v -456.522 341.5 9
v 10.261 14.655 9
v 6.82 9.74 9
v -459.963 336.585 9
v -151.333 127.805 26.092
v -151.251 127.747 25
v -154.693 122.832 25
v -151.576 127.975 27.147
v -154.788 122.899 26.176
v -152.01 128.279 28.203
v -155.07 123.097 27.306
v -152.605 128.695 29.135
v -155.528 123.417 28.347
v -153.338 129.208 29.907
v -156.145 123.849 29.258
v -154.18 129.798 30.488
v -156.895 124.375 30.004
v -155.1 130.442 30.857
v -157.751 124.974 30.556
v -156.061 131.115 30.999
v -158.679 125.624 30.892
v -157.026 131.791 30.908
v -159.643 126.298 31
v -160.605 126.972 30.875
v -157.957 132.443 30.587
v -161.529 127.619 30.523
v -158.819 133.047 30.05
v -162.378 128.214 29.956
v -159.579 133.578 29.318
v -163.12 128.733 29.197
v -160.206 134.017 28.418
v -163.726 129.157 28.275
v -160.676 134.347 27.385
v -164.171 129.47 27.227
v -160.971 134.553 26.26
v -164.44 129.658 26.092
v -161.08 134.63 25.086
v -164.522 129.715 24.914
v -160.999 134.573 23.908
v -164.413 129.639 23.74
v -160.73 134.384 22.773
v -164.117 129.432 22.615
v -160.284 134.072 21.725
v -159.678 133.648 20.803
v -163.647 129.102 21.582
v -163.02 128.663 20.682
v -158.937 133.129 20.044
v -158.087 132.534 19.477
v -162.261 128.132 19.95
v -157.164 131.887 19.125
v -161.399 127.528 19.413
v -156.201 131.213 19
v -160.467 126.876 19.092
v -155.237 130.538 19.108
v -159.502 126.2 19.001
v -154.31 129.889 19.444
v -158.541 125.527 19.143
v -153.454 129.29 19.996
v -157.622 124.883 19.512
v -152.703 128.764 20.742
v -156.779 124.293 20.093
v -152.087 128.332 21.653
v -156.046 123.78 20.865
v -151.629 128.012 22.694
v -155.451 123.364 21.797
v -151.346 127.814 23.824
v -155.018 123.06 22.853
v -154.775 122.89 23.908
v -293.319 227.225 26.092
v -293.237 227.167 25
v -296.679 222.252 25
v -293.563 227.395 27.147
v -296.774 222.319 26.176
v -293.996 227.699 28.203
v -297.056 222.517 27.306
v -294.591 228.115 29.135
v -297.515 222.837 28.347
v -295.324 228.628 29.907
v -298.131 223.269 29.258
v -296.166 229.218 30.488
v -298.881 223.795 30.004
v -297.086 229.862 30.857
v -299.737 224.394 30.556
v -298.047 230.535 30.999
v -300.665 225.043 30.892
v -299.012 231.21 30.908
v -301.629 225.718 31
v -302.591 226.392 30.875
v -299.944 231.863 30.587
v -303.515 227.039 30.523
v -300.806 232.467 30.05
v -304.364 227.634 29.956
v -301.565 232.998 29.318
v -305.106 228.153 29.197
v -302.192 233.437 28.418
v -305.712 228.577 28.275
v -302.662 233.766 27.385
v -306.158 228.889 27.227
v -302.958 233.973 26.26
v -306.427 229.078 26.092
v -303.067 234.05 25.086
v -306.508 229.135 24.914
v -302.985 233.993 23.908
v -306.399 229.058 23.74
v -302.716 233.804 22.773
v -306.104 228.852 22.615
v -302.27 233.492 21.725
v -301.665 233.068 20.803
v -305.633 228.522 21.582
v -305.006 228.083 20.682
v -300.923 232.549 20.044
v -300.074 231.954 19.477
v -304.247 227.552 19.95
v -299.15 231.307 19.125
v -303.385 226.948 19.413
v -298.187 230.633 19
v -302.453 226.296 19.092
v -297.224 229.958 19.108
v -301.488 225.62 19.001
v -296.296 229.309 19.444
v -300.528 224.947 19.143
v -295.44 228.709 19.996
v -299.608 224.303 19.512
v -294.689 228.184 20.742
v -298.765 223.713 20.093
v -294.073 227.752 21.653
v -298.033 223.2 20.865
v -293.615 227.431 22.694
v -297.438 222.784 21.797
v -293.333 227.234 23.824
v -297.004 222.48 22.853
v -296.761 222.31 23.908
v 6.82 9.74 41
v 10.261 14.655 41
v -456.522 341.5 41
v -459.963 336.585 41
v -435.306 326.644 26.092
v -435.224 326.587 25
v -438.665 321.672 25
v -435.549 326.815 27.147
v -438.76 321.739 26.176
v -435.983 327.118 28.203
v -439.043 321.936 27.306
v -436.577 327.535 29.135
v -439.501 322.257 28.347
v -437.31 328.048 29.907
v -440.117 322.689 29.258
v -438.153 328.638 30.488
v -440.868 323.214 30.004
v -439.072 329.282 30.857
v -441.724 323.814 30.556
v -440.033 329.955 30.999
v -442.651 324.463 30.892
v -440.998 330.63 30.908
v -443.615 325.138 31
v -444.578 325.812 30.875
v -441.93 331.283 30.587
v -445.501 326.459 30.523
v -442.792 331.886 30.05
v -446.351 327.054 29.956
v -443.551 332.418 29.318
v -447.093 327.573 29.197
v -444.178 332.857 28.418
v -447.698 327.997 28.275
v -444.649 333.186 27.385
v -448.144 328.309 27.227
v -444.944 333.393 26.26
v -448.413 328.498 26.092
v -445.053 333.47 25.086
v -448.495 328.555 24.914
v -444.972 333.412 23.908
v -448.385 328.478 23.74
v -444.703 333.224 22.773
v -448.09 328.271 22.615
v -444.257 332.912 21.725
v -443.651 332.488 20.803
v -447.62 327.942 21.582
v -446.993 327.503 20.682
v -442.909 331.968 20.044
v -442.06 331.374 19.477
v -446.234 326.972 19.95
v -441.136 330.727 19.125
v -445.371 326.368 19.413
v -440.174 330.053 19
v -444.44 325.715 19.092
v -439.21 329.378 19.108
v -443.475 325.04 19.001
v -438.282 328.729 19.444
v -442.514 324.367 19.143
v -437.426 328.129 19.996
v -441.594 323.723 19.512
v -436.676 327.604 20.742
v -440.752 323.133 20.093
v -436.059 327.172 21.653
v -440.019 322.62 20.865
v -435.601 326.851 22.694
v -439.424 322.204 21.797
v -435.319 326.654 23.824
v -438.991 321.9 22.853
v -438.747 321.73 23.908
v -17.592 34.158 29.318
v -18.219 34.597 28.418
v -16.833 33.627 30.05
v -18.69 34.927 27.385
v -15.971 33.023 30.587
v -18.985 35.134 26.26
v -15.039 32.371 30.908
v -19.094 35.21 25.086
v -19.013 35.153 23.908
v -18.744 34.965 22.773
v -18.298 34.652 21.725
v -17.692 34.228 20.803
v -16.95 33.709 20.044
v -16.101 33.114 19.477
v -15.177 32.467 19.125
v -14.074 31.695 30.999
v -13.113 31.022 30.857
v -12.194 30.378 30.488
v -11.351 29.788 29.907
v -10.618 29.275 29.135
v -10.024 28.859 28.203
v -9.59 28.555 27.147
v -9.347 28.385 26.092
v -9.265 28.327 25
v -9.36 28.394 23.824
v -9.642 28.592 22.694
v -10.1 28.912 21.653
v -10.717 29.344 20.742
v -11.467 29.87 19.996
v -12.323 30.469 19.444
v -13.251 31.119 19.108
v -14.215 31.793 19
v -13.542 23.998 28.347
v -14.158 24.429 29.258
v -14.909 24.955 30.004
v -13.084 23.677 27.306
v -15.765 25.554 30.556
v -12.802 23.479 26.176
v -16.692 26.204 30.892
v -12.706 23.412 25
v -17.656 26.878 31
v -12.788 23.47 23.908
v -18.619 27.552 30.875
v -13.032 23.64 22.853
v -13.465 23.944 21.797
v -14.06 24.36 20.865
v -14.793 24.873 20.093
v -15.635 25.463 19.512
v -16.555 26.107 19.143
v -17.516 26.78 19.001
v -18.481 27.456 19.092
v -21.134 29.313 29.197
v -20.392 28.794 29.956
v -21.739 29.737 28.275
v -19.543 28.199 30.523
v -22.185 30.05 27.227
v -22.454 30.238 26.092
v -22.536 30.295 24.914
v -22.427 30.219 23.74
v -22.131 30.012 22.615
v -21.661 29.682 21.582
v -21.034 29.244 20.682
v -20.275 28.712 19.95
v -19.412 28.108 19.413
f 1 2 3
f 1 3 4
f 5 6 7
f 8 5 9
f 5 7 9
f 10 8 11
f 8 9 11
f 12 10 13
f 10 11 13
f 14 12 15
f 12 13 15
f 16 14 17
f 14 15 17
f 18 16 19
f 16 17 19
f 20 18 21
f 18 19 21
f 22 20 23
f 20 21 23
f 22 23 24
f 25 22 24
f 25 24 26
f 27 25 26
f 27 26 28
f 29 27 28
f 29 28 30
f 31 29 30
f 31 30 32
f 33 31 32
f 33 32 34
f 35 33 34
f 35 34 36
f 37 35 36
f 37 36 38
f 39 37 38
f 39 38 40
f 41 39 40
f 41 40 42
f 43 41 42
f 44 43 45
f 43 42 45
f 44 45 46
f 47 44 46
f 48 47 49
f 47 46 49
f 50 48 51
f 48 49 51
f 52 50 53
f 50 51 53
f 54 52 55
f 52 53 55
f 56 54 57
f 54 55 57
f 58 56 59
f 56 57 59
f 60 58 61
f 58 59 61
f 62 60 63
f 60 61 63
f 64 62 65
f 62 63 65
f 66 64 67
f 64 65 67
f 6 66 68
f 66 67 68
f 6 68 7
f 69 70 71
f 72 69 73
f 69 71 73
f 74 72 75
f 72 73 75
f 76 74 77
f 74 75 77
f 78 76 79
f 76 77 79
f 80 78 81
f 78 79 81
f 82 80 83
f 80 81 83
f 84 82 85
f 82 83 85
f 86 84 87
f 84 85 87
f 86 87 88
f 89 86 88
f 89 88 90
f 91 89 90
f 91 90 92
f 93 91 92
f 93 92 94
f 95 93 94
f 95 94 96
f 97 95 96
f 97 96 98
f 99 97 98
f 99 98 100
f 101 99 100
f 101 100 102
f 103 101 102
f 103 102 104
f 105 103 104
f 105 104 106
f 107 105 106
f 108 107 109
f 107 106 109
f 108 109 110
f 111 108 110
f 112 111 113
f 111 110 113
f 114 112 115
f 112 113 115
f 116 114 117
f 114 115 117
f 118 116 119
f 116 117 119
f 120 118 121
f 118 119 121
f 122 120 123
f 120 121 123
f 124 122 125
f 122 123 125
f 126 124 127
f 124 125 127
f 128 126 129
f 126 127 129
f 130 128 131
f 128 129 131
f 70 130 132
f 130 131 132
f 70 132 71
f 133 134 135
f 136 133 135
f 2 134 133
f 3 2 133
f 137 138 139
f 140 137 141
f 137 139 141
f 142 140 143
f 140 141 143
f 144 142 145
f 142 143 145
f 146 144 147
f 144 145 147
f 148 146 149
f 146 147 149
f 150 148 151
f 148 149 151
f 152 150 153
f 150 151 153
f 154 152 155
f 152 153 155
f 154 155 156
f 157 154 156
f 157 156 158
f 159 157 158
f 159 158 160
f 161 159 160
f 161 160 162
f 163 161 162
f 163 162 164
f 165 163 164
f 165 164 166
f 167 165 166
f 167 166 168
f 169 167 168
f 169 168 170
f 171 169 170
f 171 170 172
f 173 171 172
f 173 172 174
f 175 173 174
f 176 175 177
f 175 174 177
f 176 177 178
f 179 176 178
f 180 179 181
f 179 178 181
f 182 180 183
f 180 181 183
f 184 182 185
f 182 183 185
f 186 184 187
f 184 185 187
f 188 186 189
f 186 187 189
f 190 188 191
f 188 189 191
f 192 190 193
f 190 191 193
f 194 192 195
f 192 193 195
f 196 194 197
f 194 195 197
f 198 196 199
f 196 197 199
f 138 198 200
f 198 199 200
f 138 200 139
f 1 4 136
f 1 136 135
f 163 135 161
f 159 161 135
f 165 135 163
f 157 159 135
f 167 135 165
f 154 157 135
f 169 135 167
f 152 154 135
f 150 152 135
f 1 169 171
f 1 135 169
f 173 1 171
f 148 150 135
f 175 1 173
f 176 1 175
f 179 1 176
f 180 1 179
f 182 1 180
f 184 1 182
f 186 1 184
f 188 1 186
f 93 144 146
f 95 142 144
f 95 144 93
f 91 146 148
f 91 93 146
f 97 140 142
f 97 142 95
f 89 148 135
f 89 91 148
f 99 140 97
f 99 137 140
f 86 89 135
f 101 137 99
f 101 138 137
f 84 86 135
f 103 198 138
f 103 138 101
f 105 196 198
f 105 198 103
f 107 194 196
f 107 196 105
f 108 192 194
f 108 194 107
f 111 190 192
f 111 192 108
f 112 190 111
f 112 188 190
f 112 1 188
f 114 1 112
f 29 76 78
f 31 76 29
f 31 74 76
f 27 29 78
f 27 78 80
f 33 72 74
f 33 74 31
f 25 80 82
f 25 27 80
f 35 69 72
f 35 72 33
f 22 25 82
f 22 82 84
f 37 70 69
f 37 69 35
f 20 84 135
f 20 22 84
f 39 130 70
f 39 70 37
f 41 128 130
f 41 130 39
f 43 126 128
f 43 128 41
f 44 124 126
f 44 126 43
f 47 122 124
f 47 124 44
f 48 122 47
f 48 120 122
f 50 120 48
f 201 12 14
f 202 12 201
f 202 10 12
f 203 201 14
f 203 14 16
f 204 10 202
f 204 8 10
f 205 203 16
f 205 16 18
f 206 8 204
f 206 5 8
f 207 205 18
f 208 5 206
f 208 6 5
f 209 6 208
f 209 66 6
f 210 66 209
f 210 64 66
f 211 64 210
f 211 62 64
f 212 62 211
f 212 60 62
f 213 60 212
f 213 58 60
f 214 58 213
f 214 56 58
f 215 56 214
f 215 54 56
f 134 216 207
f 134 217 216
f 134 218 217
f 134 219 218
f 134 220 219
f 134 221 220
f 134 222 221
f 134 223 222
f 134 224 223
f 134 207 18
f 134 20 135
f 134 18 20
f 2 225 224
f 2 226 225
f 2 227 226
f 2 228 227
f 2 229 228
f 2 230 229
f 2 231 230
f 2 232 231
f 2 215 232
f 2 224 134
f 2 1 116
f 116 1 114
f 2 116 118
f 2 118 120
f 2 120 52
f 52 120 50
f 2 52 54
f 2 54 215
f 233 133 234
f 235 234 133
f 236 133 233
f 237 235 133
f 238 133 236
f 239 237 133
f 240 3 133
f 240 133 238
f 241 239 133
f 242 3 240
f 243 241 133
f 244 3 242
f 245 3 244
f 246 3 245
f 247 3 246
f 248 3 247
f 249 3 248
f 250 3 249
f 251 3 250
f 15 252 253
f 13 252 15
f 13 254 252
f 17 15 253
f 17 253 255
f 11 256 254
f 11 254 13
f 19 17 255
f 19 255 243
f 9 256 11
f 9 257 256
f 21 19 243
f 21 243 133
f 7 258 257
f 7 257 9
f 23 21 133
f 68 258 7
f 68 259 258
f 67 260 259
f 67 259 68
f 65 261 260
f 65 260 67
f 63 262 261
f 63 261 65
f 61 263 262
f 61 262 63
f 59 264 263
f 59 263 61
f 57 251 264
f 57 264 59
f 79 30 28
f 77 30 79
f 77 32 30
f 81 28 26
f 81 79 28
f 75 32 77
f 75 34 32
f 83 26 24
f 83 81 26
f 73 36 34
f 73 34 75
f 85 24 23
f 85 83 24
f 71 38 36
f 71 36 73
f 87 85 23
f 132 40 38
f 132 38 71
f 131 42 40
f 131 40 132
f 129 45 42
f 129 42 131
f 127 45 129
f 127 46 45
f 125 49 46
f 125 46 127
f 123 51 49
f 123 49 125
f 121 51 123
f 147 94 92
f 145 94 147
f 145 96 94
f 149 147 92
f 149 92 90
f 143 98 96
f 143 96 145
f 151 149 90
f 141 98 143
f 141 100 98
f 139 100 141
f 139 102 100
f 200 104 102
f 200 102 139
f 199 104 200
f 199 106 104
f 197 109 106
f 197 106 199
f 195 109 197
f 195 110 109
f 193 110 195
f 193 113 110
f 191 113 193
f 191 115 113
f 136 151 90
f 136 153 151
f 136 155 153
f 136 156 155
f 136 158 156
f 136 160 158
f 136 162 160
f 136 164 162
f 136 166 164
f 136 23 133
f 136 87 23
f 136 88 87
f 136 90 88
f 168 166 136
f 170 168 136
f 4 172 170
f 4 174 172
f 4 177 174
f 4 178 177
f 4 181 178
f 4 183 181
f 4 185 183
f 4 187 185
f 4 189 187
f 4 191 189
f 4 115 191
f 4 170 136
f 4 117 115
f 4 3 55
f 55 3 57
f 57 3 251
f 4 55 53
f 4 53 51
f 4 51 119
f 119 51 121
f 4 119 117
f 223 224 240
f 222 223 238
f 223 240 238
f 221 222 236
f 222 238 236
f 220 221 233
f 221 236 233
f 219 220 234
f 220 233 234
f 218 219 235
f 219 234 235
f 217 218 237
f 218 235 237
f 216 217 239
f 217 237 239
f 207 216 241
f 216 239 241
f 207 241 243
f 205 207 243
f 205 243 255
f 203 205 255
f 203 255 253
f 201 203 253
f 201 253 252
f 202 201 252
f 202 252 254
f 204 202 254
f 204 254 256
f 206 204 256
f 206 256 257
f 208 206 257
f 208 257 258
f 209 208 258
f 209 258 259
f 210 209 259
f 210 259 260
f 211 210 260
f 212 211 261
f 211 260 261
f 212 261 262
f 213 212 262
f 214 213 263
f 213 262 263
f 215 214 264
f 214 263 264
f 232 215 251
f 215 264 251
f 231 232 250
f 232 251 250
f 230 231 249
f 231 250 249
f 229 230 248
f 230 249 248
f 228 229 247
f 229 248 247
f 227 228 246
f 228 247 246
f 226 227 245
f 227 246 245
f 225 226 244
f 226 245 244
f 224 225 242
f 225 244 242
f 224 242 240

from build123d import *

# Parameters (mm, degrees)
PAD006_DEPTH           = 32
SKETCH014_R            = 6
POCKET004_DEPTH        = 273.736822
LINEARPATTERN002_COUNT = 4
LINEARPATTERN002_PITCH = 173.333333


with BuildPart() as part:
    # Sketch013 → Pad006 (new body)
    with BuildSketch(Plane.XY):
        Polygon((-456.521681, 341.5), (10.26148, 14.654912), (6.820021, 9.74), (-459.963139, 336.585088), align=None)
    extrude(amount=PAD006_DEPTH)

    # Sketch014 (on Face3 of Pad006) → Pocket004 (cut, through all)
    with BuildSketch(Plane(origin=(6.820021, 9.74, 0), x_dir=(0.819152, -0.573576, 0), z_dir=(-0.573576, -0.819152, 0))):
        with Locations((-549.837021, 16)):
            Circle(SKETCH014_R)
    pocket004 = extrude(amount=-POCKET004_DEPTH, mode=Mode.SUBTRACT)

    # LinearPattern002: Pocket004 ×4
    with Locations(*[Vector(0.819152, -0.573576, 0) * (i * LINEARPATTERN002_PITCH) for i in range(1, LINEARPATTERN002_COUNT)]):
        add(pocket004, mode=Mode.SUBTRACT)


with BuildPart() as part_1:
    # Body005 placement: moved
    add(part.part.moved(Location((0, 0, 9))))


solid = part_1.part
